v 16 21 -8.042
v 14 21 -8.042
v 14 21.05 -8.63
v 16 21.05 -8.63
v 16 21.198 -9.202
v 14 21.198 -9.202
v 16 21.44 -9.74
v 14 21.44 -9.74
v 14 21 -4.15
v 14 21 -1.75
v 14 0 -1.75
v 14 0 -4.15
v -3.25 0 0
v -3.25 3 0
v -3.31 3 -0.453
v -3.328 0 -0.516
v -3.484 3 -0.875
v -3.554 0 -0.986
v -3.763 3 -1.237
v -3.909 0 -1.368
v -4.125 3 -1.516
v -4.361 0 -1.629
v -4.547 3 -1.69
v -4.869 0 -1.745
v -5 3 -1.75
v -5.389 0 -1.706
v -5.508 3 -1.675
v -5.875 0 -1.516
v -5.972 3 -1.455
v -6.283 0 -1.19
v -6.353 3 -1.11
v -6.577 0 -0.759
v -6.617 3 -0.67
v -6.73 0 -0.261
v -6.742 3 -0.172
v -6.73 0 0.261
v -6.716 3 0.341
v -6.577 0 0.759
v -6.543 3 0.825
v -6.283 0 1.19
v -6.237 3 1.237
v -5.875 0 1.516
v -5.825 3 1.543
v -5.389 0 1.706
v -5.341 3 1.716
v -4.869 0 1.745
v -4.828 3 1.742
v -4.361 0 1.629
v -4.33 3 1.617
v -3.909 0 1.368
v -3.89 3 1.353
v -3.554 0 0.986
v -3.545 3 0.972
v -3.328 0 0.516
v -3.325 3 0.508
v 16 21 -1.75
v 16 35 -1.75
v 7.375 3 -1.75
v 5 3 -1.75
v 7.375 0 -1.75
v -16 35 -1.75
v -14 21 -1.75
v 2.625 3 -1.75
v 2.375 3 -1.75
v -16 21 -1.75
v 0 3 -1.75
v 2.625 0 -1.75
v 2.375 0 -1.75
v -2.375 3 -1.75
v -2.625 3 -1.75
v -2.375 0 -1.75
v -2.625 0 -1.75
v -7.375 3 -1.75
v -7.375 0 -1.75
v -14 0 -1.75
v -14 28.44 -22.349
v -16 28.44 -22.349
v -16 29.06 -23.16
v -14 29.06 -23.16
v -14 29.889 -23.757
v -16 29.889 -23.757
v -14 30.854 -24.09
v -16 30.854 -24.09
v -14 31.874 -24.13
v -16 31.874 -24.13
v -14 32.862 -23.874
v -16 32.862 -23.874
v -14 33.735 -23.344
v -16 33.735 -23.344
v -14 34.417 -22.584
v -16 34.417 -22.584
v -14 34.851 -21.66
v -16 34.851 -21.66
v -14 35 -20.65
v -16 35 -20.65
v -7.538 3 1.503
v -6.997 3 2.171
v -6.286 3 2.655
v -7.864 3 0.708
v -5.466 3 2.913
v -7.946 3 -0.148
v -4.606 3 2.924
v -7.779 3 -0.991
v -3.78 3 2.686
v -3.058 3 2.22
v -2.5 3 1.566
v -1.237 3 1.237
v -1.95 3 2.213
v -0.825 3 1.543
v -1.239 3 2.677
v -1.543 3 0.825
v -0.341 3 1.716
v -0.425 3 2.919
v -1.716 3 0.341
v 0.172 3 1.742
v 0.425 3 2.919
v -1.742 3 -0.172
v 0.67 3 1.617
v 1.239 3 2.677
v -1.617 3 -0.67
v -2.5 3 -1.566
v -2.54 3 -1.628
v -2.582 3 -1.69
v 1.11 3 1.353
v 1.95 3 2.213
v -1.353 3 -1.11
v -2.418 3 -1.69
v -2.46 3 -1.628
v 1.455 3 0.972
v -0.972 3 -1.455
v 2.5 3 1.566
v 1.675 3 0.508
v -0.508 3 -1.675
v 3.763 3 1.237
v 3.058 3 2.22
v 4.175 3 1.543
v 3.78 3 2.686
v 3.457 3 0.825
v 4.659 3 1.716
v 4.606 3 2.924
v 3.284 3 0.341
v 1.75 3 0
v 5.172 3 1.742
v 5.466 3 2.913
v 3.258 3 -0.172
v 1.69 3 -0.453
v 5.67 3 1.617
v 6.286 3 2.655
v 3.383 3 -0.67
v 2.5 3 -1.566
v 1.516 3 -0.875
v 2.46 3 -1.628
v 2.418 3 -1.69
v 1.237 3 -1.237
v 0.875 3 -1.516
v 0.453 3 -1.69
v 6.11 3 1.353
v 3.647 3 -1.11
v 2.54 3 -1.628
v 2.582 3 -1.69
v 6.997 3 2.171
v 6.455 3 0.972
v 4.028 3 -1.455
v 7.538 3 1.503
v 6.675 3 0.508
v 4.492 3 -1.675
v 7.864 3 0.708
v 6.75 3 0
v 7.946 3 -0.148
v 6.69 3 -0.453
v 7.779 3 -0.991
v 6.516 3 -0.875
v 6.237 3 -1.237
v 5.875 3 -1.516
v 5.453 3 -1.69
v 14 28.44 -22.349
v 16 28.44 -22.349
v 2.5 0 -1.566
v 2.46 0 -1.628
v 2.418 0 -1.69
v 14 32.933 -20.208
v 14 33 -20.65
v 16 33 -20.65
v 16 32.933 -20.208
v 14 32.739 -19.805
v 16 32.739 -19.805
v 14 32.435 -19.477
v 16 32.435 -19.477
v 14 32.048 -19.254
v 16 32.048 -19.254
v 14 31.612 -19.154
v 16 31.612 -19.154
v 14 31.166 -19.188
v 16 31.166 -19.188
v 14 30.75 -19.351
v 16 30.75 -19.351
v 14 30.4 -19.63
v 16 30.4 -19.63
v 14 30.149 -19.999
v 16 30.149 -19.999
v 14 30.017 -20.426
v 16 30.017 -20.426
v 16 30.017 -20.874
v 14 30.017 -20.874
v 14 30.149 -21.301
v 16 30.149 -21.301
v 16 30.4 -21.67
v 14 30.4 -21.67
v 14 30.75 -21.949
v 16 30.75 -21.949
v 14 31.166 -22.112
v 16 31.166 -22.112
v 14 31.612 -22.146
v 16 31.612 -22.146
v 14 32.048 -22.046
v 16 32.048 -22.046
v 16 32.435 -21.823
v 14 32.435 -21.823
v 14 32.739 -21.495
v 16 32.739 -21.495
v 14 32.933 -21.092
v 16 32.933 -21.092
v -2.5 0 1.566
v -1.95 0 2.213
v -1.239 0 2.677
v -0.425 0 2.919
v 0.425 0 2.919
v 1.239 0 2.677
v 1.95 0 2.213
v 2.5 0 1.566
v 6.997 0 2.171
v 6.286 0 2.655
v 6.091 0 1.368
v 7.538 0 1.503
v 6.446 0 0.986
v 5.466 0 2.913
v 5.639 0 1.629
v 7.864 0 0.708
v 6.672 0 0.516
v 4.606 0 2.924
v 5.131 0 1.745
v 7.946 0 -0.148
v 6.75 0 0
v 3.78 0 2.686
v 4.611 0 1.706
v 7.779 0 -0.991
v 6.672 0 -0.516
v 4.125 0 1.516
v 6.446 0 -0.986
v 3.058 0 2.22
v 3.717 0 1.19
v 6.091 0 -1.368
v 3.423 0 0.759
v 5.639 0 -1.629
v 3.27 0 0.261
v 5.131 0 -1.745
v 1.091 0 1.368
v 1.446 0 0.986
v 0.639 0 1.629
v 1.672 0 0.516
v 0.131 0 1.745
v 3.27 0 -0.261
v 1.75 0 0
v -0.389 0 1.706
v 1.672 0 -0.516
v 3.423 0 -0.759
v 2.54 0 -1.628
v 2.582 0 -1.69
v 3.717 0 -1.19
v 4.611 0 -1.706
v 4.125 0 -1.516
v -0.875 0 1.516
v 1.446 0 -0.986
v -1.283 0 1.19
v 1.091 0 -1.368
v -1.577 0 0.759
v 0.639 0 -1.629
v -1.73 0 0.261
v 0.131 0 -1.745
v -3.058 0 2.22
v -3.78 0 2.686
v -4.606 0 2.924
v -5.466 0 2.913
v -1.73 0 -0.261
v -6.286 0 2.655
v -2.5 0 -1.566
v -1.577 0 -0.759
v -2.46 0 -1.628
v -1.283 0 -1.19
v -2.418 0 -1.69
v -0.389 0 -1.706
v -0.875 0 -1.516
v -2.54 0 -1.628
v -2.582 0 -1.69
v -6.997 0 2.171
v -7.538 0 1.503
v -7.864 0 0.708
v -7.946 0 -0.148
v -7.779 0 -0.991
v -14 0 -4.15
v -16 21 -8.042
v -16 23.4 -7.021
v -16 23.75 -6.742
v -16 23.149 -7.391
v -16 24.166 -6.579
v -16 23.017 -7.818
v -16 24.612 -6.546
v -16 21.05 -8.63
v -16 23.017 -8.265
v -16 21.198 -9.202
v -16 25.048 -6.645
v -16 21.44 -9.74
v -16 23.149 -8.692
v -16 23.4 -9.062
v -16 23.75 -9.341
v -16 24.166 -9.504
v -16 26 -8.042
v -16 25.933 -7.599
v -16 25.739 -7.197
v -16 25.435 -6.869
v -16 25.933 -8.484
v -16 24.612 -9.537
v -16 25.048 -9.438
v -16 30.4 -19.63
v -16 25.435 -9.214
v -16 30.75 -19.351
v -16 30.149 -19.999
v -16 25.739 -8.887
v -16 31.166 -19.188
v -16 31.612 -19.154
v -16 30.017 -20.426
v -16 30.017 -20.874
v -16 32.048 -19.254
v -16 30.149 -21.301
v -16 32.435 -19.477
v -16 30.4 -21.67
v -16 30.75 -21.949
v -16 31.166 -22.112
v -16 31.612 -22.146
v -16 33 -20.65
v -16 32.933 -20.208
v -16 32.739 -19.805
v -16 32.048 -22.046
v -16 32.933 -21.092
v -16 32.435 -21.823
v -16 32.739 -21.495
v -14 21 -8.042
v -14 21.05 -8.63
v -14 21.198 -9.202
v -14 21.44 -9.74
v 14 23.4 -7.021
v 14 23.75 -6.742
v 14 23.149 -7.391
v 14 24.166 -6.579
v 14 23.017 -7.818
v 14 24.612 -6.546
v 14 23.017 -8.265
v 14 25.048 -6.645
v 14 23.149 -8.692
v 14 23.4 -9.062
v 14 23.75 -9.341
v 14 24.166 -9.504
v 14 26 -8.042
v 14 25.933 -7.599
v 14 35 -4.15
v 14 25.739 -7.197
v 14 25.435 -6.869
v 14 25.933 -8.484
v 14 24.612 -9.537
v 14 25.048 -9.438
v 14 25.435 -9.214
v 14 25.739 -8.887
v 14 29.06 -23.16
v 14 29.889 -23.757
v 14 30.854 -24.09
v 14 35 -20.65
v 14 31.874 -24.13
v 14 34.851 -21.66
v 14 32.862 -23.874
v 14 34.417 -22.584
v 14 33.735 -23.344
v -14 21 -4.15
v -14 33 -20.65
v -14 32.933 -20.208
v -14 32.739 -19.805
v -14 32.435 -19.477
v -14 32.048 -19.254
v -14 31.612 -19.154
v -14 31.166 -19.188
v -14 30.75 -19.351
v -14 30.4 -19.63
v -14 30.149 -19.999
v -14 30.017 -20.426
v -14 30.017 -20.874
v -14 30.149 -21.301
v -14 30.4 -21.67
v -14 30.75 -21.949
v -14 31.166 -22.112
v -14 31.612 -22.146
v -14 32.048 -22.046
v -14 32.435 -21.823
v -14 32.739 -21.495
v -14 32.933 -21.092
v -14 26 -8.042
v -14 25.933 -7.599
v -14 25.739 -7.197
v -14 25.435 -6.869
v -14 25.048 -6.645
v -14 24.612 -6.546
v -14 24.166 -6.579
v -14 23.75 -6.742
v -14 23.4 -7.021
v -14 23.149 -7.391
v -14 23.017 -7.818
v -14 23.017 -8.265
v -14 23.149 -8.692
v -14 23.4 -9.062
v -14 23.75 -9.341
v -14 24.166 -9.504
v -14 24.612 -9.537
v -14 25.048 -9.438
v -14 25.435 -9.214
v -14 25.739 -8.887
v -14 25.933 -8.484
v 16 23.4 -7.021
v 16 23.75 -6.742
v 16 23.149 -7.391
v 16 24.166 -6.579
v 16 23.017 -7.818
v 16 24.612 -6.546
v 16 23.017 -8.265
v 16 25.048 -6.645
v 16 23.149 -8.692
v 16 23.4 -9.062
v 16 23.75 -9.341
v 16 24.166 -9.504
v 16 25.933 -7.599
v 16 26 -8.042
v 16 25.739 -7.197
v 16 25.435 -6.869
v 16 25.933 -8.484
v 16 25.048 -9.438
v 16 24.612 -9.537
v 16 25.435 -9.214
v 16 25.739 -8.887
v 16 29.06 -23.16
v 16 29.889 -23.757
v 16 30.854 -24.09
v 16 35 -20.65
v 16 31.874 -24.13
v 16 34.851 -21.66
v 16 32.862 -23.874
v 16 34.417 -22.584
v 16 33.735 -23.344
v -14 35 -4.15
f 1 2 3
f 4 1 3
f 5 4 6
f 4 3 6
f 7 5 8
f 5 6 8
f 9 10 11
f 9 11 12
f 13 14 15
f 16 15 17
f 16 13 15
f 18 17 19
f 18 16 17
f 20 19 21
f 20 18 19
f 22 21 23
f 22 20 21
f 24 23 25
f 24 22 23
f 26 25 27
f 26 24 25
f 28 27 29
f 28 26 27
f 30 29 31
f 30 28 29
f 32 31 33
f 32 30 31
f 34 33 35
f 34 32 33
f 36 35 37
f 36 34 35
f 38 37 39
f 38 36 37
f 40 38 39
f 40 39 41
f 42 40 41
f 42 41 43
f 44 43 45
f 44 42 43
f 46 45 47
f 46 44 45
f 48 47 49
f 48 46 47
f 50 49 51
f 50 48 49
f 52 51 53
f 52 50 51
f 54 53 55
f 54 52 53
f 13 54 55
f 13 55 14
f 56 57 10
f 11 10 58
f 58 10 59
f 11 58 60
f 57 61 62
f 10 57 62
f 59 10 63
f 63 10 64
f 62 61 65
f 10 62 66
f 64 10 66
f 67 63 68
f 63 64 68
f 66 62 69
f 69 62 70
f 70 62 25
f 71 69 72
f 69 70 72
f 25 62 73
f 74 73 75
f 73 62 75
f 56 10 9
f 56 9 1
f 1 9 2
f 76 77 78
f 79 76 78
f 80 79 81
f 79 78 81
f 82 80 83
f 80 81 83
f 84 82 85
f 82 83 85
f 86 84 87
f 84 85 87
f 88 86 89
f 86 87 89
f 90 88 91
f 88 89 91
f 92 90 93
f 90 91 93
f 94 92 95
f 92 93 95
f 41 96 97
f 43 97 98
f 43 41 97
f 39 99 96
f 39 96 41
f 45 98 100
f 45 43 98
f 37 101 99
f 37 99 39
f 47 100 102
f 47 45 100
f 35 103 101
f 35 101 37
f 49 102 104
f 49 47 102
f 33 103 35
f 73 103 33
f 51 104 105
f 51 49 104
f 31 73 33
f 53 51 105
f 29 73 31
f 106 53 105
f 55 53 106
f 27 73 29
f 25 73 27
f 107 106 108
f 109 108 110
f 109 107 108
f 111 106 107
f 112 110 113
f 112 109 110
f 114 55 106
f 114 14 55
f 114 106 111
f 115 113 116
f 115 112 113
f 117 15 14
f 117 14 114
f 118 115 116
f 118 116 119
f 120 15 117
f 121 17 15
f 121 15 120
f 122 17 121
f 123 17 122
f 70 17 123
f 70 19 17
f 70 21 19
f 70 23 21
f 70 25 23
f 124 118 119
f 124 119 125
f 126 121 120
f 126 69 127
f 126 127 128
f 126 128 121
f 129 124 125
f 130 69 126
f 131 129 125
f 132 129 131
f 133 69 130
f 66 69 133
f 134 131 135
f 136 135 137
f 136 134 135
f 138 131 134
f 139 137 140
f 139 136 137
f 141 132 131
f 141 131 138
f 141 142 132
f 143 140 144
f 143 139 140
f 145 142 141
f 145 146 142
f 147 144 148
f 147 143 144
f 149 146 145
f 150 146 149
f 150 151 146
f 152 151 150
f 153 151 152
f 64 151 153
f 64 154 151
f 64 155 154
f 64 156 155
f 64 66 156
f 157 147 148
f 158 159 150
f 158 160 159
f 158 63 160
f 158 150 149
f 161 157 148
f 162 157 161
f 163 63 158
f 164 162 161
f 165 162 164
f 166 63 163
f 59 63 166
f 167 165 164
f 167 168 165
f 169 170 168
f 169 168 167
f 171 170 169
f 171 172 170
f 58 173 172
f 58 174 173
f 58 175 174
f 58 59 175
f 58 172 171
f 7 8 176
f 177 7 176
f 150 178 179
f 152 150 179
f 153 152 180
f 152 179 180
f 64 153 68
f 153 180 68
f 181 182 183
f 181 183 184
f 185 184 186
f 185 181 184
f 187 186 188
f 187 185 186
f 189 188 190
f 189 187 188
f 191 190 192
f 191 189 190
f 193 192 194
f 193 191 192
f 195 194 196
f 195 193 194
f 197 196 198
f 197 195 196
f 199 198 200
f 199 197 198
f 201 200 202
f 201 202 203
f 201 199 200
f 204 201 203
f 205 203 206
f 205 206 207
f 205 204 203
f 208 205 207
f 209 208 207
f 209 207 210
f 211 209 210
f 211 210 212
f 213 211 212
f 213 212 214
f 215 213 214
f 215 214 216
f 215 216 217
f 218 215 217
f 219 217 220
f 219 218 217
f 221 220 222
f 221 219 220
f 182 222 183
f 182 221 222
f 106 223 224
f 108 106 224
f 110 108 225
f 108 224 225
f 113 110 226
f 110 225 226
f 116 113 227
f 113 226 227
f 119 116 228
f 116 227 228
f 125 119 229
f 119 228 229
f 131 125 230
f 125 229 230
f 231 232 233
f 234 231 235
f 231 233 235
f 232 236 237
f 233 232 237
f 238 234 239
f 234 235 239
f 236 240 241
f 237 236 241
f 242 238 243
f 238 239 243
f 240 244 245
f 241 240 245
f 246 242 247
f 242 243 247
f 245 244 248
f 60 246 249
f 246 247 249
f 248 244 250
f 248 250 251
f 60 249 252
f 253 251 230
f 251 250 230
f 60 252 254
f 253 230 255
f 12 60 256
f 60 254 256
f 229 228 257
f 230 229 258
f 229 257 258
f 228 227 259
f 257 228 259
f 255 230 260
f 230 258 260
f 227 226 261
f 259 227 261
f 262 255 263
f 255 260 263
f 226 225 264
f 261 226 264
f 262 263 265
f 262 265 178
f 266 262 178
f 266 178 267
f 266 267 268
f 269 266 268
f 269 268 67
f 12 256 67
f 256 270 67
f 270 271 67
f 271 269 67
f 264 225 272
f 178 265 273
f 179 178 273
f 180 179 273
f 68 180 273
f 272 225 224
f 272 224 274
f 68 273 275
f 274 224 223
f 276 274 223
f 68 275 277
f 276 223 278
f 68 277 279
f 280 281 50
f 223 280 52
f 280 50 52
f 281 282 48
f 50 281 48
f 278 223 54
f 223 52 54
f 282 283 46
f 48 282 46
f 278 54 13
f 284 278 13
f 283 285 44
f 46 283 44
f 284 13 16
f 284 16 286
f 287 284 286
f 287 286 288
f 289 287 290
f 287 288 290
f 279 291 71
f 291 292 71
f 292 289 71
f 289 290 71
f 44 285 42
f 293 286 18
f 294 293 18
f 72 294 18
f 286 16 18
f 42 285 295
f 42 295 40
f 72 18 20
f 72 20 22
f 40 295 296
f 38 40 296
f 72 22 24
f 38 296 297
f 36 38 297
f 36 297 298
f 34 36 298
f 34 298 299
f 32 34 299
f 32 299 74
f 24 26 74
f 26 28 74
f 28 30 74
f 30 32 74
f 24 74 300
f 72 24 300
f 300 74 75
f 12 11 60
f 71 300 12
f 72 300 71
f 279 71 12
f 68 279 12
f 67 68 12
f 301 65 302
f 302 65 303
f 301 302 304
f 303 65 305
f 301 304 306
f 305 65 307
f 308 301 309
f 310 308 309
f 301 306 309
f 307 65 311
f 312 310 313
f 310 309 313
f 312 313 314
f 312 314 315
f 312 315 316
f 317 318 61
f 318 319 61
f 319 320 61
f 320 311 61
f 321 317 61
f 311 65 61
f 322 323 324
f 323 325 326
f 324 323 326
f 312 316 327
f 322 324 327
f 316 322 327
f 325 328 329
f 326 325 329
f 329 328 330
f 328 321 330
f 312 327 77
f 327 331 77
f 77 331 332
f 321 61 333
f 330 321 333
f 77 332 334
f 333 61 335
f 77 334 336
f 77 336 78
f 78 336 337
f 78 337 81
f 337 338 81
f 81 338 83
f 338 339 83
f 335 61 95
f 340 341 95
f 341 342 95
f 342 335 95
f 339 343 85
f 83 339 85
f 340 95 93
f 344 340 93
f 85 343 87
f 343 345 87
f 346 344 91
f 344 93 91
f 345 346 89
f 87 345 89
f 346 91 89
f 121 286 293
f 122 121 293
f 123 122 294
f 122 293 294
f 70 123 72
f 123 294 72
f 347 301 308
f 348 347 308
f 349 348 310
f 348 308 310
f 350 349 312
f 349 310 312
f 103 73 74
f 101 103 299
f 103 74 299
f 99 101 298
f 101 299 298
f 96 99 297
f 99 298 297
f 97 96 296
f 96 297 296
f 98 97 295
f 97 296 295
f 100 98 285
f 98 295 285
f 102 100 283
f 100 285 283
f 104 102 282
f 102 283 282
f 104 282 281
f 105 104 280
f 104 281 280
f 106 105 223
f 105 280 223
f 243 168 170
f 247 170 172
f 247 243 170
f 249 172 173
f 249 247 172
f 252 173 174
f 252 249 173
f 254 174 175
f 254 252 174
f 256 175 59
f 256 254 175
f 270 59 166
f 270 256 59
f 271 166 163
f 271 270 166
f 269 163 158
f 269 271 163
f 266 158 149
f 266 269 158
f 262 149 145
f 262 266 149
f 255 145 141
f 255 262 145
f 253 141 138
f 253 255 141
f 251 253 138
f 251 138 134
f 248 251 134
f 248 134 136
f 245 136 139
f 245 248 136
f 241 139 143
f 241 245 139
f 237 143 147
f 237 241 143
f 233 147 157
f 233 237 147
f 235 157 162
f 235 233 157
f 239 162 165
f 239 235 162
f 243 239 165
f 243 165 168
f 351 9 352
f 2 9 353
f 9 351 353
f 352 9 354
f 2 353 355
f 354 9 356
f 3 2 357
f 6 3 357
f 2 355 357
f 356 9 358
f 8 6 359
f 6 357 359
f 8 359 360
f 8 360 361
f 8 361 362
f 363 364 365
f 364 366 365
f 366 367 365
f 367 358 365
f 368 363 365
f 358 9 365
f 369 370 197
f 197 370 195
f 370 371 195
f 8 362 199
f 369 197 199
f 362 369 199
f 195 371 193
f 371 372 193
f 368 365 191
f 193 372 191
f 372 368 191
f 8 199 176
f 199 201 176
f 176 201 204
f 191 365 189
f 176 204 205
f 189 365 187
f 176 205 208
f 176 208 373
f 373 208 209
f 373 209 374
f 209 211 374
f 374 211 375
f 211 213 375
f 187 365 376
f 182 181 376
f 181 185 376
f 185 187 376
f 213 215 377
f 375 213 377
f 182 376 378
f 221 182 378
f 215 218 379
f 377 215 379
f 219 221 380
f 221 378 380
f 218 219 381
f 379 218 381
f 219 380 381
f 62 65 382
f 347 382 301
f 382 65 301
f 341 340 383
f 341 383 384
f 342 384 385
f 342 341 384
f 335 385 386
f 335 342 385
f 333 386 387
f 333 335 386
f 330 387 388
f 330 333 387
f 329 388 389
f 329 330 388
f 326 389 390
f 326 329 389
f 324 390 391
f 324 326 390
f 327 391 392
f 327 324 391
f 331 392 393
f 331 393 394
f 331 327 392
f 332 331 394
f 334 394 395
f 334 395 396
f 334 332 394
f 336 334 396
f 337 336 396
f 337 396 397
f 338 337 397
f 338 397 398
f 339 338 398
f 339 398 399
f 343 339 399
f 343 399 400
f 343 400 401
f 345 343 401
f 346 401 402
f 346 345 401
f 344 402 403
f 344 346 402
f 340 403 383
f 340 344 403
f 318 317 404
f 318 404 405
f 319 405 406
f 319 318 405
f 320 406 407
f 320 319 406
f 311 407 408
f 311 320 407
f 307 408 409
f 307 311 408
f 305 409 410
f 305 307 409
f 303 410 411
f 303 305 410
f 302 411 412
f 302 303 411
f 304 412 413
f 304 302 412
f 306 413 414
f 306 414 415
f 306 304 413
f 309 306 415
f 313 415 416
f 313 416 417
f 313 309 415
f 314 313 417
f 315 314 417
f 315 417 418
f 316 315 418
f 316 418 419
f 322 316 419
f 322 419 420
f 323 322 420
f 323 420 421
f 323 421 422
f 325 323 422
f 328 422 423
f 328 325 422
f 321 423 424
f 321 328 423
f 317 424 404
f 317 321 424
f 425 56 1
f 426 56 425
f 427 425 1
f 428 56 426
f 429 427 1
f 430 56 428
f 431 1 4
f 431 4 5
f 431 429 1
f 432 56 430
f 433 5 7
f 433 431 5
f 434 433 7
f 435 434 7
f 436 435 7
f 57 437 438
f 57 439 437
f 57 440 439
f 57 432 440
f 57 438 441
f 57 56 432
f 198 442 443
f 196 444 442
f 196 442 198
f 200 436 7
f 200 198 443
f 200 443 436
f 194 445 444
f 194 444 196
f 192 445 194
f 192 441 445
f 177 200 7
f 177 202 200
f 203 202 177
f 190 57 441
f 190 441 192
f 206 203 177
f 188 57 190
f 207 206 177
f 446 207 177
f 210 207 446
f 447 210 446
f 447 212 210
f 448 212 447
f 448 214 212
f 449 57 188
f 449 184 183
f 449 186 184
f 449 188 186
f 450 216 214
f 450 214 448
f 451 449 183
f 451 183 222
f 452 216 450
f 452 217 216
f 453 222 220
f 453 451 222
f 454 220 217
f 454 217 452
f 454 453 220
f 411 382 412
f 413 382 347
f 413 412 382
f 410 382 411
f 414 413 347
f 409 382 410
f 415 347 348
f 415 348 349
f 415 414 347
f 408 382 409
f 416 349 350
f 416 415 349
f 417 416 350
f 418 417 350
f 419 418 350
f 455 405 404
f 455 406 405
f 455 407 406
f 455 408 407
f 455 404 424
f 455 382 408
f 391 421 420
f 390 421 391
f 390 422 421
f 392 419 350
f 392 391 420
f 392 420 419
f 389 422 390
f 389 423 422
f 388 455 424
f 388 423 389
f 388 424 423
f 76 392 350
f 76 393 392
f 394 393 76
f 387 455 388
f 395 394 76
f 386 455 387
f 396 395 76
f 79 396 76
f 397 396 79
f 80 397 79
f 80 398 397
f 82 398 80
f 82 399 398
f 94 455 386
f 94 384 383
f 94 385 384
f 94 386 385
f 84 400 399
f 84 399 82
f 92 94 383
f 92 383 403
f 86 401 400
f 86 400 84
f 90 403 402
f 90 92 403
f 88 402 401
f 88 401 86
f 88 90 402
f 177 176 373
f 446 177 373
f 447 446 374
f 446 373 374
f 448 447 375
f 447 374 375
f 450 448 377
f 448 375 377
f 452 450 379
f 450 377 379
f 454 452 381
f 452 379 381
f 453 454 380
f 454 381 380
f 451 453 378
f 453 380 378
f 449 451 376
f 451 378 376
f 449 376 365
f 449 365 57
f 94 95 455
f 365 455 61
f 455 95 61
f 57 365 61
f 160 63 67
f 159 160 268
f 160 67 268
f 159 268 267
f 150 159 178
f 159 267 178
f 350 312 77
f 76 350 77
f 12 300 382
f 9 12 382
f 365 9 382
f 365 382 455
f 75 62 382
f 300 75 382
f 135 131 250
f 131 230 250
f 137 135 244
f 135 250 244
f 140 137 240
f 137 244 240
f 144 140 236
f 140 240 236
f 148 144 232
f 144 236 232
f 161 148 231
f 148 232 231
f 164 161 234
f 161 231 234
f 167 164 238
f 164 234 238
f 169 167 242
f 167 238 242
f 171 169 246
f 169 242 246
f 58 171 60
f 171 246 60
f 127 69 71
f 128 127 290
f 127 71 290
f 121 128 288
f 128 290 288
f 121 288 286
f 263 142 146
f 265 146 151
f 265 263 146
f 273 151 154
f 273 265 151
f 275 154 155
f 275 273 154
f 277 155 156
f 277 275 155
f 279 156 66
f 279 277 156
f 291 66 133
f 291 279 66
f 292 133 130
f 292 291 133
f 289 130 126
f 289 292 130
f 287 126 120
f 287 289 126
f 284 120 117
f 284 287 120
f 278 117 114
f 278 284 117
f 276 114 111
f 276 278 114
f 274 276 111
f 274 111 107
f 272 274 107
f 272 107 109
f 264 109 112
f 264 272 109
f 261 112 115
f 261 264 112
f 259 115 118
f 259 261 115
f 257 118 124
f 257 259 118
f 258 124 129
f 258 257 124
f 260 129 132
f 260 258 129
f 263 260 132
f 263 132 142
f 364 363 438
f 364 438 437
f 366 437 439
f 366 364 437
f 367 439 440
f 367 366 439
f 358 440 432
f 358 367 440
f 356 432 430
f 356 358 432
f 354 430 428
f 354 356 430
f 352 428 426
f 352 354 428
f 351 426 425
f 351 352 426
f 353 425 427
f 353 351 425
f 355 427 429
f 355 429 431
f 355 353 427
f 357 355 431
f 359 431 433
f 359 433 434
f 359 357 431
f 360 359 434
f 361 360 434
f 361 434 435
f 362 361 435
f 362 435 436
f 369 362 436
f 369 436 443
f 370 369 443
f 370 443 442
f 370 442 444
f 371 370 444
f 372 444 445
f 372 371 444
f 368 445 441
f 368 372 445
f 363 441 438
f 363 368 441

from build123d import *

# Parameters (mm, degrees)
SKETCH2_R                = 2.95
SKETCH2_R_2              = 1.75
EXTRUDE_THIN1_DEPTH      = 3
EXTRUDE_THIN2_DEPTH      = 14
EXTRUDE_THIN2_DEPTH_BACK = 14
SKETCH3_W                = 2.4
SKETCH3_H                = 35
SKETCH4_R                = 1.5
BOSS_EXTRUDE1_DEPTH      = 2
BOSS_EXTRUDE2_START      = -30
SKETCH4_2_R              = 1.5
BOSS_EXTRUDE2_DEPTH      = 2


with BuildPart() as part:
    # Sketch2 → Extrude-Thin1 (new body)
    # profile 1 of 3: a face of its own
    with BuildSketch(Plane(origin=(0, 0, 0), x_dir=(1, 0, 0), z_dir=(0, 1, 0))):
        Circle(SKETCH2_R)
        Circle(SKETCH2_R_2, mode=Mode.SUBTRACT)
    # profile 2 of 3: a face of its own
    with BuildSketch(Plane(origin=(0, 0, 0), x_dir=(1, 0, 0), z_dir=(0, 1, 0))):
        with Locations((5, 0)):
            Circle(SKETCH2_R)
        with Locations((5, 0)):
            Circle(SKETCH2_R_2, mode=Mode.SUBTRACT)
    # profile 3 of 3: a face of its own
    with BuildSketch(Plane(origin=(0, 0, 0), x_dir=(1, 0, 0), z_dir=(0, 1, 0))):
        with Locations((-5, 0)):
            Circle(SKETCH2_R)
        with Locations((-5, 0)):
            Circle(SKETCH2_R_2, mode=Mode.SUBTRACT)
    extrude(amount=EXTRUDE_THIN1_DEPTH)

    # Sketch3 → Extrude-Thin2 (add, two sides: drawn at the far end of the back side and taken through both)
    with BuildSketch(Plane(origin=(0, 0, 0), x_dir=(0, 0, -1), z_dir=(1, 0, 0)).offset(-EXTRUDE_THIN2_DEPTH_BACK)):
        with Locations((2.95, 17.5)):
            Rectangle(SKETCH3_W, SKETCH3_H)
    extrude(amount=EXTRUDE_THIN2_DEPTH + EXTRUDE_THIN2_DEPTH_BACK)

    # Sketch4 → Boss-Extrude1 (add)
    with BuildSketch(Plane(origin=(14, 0, 0), x_dir=(0, 0, -1), z_dir=(1, 0, 0))):
        with BuildLine():
            Line((20.65, 35), (1.75, 35))
            Line((1.75, 35), (1.75, 21))
            Line((1.75, 21), (8.04152842, 21))
            ThreePointArc((8.04152842, 21), (8.918989705, 21.111776027), (9.740405769, 21.439964746))
            Line((9.740405769, 21.439964746), (22.348877349, 28.439964746))
            ThreePointArc((22.348877349, 28.439964746), (24.038223973, 32.377461285), (20.65, 35))
        make_face()
        with Locations(Location((20.65, 31.5, 0), (0, 0, 90))):
            Circle(SKETCH4_R, mode=Mode.SUBTRACT)
        with Locations(Location((8.04152842, 24.5, 0), (0, 0, 90))):
            Circle(SKETCH4_R, mode=Mode.SUBTRACT)
    extrude(amount=BOSS_EXTRUDE1_DEPTH)

    # Sketch4<2> → Boss-Extrude2 (add)
    with BuildSketch(Plane(origin=(14, 0, 0), x_dir=(0, 0, -1), z_dir=(1, 0, 0)).offset(BOSS_EXTRUDE2_START)):
        with BuildLine():
            Line((20.65, 35), (1.75, 35))
            Line((1.75, 35), (1.75, 21))
            Line((1.75, 21), (8.04152842, 21))
            ThreePointArc((8.04152842, 21), (8.918989705, 21.111776027), (9.740405769, 21.439964746))
            Line((9.740405769, 21.439964746), (22.348877349, 28.439964746))
            ThreePointArc((22.348877349, 28.439964746), (24.038223973, 32.377461285), (20.65, 35))
        make_face()
        with Locations(Location((20.65, 31.5, 0), (0, 0, 90))):
            Circle(SKETCH4_2_R, mode=Mode.SUBTRACT)
        with Locations(Location((8.04152842, 24.5, 0), (0, 0, 90))):
            Circle(SKETCH4_2_R, mode=Mode.SUBTRACT)
    extrude(amount=BOSS_EXTRUDE2_DEPTH)


solid = part.part
